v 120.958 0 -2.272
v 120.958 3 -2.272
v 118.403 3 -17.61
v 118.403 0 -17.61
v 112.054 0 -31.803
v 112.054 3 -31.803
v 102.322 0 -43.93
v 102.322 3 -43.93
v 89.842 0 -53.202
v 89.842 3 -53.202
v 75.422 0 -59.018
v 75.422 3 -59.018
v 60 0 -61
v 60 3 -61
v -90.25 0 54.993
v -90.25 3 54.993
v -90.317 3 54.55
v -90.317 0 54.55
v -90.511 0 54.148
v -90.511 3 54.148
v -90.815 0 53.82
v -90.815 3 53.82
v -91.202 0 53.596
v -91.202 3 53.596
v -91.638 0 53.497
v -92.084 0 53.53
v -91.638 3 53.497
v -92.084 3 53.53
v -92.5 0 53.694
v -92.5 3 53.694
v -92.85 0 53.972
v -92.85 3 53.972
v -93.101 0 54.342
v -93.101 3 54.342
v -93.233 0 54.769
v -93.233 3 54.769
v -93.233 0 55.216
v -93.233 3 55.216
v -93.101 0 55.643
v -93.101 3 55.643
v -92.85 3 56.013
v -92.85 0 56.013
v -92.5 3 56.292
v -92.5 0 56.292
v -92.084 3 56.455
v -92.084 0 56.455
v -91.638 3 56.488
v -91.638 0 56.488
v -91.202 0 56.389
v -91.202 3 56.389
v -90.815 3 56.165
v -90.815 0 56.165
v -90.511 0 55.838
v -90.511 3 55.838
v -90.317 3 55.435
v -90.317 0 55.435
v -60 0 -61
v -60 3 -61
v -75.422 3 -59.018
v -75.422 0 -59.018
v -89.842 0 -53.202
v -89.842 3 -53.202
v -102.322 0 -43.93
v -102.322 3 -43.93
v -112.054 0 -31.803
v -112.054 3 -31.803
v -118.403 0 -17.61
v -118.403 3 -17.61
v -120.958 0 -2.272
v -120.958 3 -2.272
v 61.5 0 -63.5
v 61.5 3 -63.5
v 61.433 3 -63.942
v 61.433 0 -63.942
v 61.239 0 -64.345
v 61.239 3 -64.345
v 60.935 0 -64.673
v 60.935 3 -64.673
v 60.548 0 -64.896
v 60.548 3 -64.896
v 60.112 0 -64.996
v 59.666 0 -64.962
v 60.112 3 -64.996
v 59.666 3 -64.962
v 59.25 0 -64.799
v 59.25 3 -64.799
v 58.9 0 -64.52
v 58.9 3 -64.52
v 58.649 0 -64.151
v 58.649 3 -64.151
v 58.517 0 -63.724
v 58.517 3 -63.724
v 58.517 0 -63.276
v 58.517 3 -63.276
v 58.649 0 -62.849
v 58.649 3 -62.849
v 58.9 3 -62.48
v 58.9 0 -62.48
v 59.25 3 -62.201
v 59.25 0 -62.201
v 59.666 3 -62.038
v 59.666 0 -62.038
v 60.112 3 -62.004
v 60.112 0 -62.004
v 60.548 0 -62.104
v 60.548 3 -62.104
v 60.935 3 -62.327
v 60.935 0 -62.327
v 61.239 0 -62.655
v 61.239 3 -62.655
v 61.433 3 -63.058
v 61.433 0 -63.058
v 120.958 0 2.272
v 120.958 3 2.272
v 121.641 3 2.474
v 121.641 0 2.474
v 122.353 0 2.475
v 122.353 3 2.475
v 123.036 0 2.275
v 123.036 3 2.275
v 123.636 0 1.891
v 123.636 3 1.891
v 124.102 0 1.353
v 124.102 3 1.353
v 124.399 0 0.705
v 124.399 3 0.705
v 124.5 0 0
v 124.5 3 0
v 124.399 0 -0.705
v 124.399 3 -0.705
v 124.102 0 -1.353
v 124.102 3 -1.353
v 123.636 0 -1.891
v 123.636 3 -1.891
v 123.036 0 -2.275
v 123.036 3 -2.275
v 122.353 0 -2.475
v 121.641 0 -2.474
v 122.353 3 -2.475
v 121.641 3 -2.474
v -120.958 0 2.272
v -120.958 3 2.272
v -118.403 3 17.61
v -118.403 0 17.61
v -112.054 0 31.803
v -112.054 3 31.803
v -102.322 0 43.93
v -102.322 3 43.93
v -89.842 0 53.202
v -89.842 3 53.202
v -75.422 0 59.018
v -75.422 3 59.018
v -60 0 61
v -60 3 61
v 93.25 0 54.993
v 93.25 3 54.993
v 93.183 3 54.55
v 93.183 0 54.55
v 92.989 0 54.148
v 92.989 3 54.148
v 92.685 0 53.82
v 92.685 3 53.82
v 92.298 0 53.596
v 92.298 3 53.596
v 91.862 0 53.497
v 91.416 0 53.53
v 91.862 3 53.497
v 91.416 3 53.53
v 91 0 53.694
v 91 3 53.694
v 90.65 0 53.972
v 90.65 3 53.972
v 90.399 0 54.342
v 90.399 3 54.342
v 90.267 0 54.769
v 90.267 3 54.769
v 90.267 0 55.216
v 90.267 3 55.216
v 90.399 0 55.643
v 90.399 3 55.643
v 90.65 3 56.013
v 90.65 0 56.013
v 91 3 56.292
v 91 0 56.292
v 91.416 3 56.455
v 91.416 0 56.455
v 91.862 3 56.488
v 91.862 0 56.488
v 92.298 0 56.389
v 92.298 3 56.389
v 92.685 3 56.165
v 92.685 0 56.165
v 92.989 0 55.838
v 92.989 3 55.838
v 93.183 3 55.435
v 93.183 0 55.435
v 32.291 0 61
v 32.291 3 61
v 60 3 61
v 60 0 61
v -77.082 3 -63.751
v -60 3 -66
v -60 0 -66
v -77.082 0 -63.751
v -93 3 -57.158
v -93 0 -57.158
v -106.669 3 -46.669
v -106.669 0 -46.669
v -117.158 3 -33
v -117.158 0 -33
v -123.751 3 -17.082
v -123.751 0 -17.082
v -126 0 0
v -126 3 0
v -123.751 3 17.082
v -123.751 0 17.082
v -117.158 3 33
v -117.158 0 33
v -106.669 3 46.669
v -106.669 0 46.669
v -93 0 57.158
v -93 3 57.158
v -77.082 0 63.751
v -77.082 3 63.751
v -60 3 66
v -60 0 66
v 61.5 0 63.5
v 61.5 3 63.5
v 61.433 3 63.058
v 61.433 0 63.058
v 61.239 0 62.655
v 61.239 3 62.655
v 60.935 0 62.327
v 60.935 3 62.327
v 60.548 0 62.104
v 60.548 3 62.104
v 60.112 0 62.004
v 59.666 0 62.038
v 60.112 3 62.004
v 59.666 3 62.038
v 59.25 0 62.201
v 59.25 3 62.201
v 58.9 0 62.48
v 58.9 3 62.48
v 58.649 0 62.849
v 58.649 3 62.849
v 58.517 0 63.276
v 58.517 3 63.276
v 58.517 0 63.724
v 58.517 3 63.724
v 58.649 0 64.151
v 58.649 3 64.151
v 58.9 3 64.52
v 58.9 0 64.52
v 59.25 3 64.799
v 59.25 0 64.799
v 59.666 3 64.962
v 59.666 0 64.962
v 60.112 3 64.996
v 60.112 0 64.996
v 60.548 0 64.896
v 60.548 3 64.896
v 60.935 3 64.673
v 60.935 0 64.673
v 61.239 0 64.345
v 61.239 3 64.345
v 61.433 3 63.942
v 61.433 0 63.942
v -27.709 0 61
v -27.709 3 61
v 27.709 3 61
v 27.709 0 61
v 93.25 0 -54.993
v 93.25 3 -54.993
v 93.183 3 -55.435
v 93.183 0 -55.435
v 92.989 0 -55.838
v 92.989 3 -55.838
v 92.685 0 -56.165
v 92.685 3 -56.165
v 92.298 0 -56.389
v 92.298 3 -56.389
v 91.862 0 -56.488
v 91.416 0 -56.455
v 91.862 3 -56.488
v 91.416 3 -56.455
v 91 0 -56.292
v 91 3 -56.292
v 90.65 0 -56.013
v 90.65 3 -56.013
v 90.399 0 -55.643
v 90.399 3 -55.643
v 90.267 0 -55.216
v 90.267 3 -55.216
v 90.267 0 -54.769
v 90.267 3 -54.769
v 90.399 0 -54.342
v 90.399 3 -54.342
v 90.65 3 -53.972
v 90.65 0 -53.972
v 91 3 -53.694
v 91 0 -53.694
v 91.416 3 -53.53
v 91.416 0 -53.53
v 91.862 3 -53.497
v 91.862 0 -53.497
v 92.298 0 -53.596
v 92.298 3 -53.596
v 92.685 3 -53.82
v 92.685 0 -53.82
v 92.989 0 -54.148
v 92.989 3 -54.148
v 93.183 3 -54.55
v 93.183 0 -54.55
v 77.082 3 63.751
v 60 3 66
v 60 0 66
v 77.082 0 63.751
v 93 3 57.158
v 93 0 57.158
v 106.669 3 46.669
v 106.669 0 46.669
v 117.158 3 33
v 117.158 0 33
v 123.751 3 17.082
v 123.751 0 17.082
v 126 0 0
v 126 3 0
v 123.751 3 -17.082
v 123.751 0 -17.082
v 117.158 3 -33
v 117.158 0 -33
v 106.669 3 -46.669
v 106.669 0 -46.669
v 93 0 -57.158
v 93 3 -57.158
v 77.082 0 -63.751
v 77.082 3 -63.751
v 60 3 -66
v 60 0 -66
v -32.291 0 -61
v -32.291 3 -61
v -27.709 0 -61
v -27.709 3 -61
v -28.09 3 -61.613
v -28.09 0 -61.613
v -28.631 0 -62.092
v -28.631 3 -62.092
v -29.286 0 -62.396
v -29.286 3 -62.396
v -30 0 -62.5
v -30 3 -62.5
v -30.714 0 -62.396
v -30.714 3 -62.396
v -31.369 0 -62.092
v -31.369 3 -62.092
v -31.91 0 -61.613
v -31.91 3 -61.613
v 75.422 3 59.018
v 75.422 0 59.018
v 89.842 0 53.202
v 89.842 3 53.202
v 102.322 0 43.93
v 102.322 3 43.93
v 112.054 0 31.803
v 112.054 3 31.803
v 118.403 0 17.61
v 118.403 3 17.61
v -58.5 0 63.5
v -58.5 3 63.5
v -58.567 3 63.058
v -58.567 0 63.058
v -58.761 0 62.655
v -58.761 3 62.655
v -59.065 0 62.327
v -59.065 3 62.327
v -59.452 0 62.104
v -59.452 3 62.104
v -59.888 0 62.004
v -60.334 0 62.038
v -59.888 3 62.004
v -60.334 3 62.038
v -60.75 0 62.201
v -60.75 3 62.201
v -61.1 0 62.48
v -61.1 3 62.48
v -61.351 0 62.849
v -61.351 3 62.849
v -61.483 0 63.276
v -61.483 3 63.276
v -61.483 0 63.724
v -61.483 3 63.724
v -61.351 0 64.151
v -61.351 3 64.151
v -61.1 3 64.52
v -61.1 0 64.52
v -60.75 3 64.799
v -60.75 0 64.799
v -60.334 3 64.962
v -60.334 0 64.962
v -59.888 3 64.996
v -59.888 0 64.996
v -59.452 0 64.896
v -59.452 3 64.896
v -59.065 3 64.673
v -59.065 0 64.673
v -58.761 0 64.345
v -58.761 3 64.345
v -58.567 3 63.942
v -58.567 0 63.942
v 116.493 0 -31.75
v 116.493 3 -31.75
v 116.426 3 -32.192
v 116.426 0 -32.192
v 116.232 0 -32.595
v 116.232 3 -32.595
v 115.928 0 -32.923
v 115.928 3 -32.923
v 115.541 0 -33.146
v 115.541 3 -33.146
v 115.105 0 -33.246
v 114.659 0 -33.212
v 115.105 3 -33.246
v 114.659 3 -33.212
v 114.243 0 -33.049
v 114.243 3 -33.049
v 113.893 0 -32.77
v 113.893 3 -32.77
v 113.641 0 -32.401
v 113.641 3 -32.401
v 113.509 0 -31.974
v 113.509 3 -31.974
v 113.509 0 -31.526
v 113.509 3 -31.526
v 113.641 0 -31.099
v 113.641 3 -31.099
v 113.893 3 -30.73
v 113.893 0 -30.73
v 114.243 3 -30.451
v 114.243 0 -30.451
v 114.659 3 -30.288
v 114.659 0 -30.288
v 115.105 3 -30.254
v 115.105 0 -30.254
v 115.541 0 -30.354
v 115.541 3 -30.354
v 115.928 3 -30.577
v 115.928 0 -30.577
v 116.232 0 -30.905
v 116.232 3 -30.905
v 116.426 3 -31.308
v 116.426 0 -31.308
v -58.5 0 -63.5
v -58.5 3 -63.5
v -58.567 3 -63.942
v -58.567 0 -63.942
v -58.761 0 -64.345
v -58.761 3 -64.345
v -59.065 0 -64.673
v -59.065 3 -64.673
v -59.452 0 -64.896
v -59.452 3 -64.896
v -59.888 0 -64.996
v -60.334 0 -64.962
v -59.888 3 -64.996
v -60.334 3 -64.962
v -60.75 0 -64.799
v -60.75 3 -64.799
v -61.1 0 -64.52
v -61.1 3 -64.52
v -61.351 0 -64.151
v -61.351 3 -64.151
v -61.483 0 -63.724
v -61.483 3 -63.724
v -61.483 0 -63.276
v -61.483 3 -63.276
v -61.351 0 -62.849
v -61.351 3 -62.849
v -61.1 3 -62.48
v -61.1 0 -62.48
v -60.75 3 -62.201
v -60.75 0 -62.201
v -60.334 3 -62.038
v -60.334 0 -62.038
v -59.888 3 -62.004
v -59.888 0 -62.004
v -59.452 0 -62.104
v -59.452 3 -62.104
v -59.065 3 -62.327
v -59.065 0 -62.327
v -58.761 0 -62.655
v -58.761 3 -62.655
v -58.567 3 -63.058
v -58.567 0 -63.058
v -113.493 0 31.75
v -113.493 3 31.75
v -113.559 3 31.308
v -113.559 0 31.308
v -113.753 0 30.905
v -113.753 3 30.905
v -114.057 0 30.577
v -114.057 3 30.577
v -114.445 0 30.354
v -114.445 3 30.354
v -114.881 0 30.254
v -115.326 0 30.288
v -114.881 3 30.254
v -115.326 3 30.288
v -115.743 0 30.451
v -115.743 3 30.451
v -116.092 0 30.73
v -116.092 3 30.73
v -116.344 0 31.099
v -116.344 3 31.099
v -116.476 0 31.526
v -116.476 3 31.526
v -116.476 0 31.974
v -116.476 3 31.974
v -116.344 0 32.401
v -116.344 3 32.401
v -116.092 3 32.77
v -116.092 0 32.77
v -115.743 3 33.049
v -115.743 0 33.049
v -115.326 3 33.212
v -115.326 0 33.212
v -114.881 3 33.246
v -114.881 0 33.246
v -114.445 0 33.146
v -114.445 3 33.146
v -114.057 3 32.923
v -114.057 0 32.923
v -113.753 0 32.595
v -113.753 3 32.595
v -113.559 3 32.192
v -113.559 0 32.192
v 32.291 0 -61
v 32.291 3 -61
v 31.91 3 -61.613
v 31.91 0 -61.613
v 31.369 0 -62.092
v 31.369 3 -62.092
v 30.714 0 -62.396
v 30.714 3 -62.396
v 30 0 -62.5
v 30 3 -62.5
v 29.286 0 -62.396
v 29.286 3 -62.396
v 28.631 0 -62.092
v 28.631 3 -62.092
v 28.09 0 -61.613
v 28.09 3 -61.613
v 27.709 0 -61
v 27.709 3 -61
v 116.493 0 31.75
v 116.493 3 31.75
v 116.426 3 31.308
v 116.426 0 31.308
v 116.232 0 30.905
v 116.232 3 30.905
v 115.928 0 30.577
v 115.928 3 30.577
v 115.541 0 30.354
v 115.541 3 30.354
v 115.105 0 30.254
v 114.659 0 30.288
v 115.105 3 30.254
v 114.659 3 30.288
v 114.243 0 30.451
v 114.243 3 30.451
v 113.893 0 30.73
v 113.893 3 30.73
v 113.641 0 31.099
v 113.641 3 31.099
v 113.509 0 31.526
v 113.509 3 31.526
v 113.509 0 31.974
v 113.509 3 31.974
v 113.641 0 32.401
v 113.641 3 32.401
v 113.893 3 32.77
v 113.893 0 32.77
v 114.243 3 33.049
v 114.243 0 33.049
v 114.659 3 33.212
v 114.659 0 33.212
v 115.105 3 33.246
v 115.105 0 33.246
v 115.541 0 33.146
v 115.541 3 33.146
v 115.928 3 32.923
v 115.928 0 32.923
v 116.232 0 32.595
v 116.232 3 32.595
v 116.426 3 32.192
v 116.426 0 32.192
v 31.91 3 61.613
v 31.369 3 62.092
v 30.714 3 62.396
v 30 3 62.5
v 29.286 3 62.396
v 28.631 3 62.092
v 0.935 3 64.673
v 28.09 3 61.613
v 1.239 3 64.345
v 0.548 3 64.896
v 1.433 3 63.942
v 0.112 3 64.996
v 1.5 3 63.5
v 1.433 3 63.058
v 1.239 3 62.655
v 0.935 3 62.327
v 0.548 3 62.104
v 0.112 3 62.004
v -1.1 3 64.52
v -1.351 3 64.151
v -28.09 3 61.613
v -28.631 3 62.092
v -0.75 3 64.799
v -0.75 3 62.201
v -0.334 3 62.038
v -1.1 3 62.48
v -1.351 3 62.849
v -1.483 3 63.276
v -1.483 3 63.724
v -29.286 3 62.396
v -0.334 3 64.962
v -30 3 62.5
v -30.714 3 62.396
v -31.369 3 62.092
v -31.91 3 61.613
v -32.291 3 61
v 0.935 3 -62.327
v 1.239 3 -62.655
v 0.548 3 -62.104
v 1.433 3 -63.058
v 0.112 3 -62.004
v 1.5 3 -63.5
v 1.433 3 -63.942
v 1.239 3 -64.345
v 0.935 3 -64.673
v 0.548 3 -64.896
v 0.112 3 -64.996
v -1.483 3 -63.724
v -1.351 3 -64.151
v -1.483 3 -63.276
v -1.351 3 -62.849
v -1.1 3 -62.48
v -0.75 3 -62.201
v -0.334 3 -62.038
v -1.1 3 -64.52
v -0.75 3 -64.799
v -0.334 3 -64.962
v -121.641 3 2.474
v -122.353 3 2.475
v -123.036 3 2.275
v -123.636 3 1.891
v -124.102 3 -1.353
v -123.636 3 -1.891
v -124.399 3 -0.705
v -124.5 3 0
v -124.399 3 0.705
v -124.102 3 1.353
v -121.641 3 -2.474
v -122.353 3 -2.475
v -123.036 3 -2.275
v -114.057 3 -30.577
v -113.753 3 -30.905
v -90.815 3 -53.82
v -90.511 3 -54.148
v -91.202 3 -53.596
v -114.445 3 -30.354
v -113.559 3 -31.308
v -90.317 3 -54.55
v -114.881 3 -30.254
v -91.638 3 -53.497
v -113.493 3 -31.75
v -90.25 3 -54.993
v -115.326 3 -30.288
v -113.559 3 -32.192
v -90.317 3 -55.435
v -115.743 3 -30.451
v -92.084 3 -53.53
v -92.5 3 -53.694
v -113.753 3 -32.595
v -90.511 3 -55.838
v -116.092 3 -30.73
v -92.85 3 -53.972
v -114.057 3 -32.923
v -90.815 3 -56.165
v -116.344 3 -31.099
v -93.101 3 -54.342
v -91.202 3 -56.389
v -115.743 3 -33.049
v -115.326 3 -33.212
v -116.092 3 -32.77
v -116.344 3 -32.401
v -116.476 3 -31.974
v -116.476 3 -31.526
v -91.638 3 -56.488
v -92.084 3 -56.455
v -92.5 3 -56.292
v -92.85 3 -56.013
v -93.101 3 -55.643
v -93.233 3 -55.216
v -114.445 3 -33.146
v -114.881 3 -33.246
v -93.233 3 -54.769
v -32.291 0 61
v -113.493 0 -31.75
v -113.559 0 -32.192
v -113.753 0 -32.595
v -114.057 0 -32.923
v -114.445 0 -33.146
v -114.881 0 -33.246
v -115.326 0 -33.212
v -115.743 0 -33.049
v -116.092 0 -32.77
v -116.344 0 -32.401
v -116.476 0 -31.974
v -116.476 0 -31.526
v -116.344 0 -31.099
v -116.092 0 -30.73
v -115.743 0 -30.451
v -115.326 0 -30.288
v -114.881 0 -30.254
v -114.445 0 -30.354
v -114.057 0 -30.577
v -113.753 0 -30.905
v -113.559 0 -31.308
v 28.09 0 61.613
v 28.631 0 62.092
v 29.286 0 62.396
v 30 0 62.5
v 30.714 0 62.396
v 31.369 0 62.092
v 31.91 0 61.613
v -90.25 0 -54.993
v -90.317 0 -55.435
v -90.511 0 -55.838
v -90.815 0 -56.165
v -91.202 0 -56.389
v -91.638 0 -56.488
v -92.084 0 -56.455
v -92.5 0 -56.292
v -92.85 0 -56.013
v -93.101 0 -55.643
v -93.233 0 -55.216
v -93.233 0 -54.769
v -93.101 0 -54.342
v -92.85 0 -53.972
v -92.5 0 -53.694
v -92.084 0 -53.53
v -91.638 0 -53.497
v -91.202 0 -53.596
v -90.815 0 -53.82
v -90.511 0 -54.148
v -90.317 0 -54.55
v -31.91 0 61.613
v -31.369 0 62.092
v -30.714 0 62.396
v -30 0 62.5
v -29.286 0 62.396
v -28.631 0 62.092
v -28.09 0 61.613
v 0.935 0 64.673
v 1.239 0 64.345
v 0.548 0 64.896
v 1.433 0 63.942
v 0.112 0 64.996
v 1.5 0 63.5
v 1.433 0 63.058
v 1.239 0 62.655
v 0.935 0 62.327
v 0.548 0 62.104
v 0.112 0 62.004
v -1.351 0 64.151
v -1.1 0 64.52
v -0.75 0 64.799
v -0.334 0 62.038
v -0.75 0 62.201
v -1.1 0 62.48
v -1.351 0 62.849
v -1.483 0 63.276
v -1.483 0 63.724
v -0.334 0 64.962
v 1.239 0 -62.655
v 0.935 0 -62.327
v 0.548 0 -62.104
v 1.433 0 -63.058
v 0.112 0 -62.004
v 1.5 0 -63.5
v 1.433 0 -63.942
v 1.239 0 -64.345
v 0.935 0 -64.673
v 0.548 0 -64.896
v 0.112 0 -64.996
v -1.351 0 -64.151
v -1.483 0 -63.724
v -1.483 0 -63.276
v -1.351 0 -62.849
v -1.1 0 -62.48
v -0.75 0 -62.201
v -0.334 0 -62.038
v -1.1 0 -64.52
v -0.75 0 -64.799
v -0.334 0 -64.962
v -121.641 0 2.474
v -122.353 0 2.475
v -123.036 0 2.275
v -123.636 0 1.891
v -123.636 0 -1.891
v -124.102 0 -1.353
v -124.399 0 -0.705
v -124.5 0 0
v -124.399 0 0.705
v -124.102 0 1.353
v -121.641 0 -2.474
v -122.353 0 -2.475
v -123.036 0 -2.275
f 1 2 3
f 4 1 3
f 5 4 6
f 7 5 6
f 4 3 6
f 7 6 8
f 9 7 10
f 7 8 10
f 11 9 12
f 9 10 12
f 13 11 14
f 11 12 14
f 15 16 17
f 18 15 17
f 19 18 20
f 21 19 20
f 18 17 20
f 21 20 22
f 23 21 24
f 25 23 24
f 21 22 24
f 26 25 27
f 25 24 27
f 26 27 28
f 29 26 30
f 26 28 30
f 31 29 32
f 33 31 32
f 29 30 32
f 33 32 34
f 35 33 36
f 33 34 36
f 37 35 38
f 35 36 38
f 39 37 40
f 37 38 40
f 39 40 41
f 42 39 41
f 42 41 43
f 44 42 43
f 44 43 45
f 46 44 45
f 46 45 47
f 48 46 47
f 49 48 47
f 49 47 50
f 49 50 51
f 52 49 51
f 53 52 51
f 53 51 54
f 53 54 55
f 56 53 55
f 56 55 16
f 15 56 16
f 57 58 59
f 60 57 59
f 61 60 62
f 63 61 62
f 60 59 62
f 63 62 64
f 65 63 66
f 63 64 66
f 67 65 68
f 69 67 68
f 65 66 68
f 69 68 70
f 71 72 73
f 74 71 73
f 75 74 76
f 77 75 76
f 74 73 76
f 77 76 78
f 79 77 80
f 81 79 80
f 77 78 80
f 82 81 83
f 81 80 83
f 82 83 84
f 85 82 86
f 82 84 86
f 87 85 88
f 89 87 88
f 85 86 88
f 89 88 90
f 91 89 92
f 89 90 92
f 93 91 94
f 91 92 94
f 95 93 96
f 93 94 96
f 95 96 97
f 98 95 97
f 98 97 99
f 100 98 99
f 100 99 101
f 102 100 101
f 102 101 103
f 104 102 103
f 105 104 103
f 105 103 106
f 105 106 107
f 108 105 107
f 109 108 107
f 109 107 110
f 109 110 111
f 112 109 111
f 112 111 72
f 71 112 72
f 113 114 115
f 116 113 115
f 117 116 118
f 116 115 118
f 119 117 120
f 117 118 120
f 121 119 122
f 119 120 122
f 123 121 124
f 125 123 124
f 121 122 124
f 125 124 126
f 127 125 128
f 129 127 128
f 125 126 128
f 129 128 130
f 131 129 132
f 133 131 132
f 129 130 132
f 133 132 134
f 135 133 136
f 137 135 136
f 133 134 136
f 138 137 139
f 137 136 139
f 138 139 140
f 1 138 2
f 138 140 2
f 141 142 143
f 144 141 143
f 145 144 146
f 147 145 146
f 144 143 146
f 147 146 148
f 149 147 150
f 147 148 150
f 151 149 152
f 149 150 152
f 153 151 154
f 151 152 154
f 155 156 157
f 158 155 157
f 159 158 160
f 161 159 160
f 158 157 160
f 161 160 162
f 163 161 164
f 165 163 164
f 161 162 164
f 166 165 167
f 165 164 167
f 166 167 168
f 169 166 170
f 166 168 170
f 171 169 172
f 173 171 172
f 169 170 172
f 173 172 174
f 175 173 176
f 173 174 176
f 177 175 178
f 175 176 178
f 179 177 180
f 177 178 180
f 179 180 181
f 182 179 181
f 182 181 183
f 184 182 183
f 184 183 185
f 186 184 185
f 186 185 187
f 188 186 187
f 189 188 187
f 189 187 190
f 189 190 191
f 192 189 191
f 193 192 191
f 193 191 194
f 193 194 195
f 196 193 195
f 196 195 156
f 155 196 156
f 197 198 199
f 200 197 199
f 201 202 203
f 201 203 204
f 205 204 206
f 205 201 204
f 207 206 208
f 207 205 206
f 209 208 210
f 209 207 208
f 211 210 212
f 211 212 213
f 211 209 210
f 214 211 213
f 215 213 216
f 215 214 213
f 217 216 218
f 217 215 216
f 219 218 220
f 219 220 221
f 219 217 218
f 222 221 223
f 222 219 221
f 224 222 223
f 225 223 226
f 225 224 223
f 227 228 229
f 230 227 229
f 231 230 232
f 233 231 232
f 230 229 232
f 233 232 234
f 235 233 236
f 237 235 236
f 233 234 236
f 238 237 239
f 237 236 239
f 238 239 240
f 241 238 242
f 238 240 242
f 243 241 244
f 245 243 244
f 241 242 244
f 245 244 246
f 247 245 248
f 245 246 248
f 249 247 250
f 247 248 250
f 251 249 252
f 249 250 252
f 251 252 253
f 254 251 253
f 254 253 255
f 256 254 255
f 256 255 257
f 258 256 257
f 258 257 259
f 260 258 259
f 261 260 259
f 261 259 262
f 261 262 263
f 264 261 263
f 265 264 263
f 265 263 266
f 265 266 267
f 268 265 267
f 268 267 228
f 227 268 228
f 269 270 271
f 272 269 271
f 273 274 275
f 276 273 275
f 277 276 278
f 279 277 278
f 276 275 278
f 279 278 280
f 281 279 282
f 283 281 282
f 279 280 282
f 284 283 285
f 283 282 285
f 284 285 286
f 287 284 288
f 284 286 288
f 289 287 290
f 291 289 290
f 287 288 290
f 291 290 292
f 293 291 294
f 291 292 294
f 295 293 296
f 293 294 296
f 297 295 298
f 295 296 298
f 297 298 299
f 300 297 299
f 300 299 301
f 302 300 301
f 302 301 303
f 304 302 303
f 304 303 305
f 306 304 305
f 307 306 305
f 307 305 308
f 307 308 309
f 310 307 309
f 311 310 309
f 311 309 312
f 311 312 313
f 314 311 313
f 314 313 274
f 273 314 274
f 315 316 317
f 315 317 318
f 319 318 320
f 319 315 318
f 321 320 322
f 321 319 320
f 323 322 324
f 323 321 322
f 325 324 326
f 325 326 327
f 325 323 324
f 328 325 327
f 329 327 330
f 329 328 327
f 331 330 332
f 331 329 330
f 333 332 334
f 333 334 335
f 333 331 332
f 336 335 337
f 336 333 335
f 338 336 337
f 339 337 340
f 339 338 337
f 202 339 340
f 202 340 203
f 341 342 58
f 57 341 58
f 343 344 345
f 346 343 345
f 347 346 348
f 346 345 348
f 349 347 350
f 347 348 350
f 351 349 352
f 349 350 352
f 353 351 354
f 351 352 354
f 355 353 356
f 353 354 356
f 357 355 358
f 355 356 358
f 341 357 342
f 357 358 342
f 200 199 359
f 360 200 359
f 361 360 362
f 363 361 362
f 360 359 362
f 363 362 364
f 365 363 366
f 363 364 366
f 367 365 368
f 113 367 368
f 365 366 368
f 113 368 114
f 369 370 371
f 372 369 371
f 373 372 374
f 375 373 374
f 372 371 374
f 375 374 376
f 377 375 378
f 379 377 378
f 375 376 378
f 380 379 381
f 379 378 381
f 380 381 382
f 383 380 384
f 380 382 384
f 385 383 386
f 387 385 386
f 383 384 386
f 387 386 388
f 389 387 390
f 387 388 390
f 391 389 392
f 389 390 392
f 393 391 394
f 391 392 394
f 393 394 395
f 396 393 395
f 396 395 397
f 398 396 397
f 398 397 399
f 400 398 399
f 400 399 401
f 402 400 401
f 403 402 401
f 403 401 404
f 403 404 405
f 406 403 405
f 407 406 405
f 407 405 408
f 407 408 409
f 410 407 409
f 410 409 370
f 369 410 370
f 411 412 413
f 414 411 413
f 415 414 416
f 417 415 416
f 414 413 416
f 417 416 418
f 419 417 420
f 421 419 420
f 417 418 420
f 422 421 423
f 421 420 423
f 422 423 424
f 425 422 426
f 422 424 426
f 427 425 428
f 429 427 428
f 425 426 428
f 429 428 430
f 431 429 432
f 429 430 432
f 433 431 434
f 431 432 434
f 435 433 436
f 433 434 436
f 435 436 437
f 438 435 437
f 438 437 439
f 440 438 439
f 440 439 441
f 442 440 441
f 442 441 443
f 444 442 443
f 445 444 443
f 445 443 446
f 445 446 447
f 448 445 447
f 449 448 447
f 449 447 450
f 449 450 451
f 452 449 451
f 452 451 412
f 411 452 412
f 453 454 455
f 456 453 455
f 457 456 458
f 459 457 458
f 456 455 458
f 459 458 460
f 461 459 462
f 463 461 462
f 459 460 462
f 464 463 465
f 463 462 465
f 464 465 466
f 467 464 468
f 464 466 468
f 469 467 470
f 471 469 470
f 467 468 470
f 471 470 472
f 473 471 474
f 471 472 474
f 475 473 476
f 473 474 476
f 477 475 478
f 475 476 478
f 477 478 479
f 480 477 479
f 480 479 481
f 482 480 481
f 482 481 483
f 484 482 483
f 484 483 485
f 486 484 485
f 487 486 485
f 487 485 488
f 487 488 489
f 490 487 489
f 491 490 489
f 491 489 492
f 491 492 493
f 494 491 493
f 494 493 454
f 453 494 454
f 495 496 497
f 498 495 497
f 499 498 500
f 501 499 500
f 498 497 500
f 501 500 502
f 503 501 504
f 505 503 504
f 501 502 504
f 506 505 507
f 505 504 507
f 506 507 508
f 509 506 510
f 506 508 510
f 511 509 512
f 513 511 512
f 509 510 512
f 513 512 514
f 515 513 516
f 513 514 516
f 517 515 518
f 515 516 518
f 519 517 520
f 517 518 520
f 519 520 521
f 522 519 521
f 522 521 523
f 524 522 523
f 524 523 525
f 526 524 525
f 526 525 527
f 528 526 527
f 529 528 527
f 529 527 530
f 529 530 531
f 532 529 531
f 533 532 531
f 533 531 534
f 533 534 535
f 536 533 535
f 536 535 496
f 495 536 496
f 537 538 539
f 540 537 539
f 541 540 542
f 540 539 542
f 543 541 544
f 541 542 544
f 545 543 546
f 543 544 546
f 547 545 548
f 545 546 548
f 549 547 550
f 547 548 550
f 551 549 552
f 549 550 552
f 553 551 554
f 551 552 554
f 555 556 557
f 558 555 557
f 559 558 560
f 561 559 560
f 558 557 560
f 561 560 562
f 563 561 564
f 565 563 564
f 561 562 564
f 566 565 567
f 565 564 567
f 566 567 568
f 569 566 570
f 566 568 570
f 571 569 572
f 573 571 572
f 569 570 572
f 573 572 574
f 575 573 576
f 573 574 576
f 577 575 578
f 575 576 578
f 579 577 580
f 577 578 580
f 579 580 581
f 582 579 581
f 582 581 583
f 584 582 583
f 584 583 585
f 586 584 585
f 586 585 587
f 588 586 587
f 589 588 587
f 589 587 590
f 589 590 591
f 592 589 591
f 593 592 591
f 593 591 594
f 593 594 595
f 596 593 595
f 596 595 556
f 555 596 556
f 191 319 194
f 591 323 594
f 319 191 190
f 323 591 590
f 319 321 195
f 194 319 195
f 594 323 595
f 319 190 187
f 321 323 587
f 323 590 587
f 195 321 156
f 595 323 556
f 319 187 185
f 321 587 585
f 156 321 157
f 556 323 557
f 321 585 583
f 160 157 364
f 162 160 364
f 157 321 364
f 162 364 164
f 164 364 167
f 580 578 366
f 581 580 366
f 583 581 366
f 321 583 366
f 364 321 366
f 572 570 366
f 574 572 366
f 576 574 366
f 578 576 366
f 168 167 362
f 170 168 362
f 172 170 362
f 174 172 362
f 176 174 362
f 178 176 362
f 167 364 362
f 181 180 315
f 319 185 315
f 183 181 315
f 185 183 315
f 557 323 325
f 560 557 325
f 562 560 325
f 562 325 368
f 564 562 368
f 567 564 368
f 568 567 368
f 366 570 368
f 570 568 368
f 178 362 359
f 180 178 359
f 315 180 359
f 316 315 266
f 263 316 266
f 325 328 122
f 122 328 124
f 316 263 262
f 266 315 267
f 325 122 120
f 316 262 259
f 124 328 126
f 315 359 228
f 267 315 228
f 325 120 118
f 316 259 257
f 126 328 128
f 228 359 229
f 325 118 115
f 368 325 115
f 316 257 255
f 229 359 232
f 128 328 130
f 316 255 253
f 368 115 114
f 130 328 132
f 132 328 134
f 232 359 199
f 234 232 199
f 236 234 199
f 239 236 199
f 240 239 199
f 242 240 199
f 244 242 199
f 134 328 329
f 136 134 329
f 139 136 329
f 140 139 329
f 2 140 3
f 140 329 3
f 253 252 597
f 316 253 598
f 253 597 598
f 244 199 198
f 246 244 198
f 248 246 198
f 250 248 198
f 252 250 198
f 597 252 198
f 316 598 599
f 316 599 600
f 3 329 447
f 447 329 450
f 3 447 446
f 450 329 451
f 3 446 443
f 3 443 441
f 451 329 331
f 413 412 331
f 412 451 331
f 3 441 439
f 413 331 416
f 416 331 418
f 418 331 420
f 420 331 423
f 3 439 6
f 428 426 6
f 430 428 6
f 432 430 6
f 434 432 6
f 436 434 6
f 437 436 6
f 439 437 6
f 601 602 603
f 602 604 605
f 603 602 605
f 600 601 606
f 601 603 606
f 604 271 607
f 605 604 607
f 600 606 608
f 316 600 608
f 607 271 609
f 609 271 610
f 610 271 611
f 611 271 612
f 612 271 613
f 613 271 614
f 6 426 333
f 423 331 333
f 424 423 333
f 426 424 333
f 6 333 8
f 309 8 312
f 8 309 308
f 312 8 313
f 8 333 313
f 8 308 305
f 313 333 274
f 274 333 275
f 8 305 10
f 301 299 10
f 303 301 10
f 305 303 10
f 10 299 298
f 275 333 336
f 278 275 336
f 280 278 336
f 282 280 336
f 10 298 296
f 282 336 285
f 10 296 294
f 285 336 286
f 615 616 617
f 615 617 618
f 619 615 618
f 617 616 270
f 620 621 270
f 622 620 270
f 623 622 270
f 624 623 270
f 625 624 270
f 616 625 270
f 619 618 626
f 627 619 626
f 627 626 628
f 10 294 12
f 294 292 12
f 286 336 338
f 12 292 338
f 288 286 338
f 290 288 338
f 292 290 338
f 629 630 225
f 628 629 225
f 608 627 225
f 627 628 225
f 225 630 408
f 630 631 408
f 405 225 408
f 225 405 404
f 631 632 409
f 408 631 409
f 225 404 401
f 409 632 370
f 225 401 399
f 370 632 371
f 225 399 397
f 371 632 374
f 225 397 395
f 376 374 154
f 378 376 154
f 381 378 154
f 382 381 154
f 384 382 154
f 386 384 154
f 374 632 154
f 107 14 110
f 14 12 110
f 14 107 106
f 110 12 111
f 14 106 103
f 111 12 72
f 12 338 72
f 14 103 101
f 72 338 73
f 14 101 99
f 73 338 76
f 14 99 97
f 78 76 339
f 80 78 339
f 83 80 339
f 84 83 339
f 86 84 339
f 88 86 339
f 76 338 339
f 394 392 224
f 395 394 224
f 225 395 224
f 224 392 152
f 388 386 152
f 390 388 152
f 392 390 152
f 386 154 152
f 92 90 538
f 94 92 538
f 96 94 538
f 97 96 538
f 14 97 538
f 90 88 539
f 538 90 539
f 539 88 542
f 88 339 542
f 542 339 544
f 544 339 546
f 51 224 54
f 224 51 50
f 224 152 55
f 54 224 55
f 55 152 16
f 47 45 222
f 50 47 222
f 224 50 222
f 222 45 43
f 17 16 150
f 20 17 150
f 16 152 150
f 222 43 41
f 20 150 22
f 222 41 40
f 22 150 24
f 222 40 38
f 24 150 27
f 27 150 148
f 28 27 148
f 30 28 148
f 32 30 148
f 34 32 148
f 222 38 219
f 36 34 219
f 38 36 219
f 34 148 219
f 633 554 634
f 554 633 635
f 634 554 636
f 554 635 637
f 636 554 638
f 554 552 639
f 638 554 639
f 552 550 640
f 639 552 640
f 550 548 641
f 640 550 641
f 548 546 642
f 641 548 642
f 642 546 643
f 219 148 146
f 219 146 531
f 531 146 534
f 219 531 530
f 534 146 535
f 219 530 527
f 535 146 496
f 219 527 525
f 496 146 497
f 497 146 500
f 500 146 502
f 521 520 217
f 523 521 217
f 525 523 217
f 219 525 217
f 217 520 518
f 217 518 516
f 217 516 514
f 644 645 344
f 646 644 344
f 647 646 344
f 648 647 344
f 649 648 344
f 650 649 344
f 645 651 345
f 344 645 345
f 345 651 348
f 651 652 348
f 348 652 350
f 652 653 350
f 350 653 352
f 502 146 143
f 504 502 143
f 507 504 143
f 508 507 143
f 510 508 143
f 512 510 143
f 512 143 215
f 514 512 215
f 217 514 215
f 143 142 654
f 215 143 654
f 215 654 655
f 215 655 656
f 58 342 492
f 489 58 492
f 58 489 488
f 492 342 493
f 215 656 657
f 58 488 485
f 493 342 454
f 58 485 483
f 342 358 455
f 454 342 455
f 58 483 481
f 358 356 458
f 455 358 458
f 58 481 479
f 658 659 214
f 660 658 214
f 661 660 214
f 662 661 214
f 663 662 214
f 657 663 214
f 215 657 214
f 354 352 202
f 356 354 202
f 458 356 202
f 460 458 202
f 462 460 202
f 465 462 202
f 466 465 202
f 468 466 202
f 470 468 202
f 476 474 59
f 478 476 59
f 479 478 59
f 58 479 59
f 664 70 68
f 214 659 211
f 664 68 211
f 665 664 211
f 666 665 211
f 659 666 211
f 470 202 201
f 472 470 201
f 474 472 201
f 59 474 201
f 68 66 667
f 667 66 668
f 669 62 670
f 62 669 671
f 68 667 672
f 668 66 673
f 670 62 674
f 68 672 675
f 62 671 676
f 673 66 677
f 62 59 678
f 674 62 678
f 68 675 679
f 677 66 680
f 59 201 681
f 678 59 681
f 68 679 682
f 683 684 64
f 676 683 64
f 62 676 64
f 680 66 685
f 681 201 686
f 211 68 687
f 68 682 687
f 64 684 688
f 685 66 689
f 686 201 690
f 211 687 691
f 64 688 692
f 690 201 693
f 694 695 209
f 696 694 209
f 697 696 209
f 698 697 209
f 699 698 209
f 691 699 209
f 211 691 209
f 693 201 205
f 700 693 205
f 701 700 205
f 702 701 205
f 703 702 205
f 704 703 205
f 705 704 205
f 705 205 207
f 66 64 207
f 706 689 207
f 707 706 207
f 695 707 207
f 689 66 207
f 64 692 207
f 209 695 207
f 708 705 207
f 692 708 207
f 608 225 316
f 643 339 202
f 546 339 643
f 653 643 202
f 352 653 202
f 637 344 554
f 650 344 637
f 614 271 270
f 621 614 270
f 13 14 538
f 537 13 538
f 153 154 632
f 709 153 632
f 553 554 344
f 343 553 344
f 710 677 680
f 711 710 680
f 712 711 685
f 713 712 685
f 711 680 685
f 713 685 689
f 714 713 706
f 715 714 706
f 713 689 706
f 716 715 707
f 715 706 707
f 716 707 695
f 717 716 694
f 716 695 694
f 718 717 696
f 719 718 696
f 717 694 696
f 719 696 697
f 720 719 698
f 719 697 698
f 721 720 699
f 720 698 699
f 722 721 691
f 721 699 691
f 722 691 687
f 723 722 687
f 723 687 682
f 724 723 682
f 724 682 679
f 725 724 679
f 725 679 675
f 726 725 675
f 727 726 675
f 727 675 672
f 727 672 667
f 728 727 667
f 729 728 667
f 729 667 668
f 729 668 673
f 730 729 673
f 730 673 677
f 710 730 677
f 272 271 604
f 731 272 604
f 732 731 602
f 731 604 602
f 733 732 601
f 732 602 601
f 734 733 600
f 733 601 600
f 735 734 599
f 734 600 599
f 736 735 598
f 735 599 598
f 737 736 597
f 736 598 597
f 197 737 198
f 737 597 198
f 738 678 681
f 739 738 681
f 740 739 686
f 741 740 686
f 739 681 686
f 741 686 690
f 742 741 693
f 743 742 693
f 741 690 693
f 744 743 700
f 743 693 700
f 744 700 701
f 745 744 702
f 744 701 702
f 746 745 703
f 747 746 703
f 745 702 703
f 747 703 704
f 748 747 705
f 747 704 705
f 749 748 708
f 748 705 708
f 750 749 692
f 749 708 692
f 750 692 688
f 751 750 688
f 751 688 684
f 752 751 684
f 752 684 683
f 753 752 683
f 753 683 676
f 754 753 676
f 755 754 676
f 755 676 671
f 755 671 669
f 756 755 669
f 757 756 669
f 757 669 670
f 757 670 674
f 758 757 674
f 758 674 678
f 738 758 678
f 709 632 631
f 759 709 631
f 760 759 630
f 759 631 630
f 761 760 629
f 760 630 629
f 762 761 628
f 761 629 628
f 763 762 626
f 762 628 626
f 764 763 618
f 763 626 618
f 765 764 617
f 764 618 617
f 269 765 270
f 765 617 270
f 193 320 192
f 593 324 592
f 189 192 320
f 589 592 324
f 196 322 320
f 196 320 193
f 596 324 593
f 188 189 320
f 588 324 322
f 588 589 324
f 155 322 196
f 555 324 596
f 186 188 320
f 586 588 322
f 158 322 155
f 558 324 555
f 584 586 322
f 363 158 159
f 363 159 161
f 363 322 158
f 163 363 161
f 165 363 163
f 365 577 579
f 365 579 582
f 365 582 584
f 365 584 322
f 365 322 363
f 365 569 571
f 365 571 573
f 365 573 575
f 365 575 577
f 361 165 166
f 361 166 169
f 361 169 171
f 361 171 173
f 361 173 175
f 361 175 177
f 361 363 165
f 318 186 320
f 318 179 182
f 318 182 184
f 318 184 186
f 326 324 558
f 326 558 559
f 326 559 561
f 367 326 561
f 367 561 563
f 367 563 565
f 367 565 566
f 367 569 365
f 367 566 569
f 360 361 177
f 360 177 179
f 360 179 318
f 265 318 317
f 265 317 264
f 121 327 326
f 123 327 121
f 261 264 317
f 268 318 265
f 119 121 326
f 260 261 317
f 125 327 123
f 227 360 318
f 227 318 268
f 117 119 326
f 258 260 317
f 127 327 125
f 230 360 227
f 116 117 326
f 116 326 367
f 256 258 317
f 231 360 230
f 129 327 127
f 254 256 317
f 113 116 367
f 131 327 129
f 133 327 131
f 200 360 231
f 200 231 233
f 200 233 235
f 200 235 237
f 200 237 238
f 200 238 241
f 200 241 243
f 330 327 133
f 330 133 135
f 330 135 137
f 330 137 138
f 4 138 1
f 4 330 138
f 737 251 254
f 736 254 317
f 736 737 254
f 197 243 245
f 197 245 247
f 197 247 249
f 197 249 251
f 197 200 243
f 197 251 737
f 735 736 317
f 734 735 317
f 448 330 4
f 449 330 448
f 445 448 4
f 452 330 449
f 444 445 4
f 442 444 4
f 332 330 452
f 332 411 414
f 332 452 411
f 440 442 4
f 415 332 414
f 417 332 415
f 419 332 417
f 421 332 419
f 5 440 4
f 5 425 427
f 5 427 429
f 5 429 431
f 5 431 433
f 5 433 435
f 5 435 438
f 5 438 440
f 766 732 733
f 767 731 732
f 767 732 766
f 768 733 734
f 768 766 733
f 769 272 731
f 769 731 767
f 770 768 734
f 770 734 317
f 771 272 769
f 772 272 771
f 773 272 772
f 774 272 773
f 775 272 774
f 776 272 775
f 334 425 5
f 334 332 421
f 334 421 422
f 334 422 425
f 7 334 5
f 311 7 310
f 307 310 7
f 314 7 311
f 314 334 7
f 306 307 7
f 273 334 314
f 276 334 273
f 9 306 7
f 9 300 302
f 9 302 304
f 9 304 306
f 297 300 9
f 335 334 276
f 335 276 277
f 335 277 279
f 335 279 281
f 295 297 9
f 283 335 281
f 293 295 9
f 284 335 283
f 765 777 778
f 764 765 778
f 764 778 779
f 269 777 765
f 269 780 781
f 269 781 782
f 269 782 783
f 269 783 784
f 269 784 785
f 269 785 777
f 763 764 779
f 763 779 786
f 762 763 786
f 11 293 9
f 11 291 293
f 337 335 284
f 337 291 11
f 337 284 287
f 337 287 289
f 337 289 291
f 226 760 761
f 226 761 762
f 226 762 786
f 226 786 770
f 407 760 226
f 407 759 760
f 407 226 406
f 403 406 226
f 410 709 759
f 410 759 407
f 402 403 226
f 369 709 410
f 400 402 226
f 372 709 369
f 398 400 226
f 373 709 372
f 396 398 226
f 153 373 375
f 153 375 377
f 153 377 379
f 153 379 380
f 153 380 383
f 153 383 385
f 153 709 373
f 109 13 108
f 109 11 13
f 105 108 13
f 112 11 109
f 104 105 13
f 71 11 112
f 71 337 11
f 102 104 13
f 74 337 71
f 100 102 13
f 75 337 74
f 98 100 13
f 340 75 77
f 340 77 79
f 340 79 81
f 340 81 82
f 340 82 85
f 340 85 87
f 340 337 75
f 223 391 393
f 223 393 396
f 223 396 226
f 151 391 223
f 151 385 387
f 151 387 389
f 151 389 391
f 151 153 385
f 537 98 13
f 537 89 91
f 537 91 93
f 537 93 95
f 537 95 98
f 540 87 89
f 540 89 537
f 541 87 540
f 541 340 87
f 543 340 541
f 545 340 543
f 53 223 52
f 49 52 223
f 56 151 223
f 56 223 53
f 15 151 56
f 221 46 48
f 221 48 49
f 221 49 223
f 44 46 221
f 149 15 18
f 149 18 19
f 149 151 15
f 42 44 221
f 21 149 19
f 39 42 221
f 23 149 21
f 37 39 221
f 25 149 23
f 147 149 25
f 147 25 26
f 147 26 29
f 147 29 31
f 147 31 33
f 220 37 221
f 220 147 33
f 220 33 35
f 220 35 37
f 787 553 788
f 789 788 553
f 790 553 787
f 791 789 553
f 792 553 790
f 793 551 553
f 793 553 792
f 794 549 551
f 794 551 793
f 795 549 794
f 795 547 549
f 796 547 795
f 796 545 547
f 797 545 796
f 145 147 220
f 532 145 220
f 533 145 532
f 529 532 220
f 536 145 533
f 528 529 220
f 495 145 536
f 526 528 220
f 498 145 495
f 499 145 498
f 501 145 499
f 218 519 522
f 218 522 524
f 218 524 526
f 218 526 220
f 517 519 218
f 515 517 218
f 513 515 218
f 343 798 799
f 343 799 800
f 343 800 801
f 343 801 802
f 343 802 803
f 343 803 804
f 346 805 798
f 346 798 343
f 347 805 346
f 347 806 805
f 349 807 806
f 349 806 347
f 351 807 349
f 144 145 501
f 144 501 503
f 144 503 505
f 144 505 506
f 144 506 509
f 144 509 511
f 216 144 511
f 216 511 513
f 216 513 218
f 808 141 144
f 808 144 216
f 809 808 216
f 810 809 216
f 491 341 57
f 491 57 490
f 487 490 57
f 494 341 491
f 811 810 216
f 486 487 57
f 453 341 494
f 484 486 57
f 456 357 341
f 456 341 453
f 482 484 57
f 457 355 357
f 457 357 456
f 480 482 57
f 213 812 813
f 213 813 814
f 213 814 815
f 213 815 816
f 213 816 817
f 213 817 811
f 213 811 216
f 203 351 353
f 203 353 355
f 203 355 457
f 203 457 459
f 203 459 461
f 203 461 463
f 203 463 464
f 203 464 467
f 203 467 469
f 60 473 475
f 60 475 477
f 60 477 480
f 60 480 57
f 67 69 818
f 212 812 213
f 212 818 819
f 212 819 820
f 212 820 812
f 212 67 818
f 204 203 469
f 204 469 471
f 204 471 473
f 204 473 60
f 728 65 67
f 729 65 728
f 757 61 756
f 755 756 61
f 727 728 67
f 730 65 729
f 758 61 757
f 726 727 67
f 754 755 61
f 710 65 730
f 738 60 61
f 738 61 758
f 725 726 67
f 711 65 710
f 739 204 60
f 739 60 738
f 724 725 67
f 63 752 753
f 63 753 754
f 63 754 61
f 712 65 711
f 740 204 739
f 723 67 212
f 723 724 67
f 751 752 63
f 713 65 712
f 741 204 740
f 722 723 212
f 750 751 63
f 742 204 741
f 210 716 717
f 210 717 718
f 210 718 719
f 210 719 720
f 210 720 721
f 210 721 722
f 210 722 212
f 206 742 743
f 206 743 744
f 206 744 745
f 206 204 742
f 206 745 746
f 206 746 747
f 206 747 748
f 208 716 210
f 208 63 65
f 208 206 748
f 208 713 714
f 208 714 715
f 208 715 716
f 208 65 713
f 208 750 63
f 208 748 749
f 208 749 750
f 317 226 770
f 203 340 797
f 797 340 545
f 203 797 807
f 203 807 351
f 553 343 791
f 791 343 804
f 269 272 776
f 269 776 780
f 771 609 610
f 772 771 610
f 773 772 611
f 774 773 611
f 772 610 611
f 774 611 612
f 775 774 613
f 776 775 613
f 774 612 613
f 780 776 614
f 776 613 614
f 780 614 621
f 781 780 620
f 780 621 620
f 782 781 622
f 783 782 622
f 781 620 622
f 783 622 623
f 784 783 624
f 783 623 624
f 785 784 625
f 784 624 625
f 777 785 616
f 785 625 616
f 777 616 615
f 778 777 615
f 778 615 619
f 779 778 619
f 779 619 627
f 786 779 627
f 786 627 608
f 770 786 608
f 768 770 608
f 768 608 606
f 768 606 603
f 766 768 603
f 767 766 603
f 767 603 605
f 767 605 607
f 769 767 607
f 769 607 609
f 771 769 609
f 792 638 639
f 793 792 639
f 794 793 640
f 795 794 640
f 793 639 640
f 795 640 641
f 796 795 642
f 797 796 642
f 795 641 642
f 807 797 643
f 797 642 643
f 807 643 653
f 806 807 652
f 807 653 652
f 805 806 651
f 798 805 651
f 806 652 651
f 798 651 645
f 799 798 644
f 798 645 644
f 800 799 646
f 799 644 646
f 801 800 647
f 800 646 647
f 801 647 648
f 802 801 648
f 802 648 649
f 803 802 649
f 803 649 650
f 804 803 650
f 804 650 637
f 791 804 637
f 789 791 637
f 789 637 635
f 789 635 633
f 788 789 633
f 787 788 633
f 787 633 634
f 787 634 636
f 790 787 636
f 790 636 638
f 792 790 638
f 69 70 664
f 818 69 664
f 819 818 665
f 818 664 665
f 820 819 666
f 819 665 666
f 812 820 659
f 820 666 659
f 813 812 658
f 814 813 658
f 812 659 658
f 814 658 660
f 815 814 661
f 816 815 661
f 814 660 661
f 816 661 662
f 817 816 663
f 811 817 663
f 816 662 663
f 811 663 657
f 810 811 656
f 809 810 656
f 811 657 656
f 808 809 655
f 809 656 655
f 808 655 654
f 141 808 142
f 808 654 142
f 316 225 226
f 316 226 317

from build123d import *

# Parameters (mm, degrees)
SKETCH_1_R          = 1.5
EXTRUDE_2_DEPTH     = 3
CUT_EXTRUDE_1_DEPTH = 10
SKETCH_4_R          = 7.5
CUT_EXTRUDE_2_DEPTH = 10
SKETCH_5_R          = 1.5
CUT_EXTRUDE_3_DEPTH = 10
CUT_EXTRUDE_4_DEPTH = 10


with BuildPart() as part:
    # 草图1 → 凸台-拉伸2 (new body)
    with BuildSketch(Plane(origin=(0, 0, 0), x_dir=(1, 0, 0), z_dir=(0, 1, 0))):
        with BuildLine():
            Line((-60, 70), (60, 70))
            ThreePointArc((60, 70), (130, 0), (60, -70))
            Line((60, -70), (-60, -70))
            ThreePointArc((-60, -70), (-130, 0), (-60, 70))
        make_face()
        with Locations((-122, 0)):
            Circle(SKETCH_1_R, mode=Mode.SUBTRACT)
        with Locations((122, 0)):
            Circle(SKETCH_1_R, mode=Mode.SUBTRACT)
        with Locations((-30, 60)):
            Circle(SKETCH_1_R, mode=Mode.SUBTRACT)
        with Locations((30, 60)):
            Circle(SKETCH_1_R, mode=Mode.SUBTRACT)
        with Locations((30, -60)):
            Circle(SKETCH_1_R, mode=Mode.SUBTRACT)
        with Locations((-30, -60)):
            Circle(SKETCH_1_R, mode=Mode.SUBTRACT)
    extrude(amount=EXTRUDE_2_DEPTH)

    # 草图3 → 切除-拉伸1 (cut)
    with BuildSketch(Plane(origin=(0, 3, 0), x_dir=(1, 0, 0), z_dir=(0, 1, 0))):
        with BuildLine():
            Line((-60, -70), (60, -70))
            ThreePointArc((60, -70), (130, 0), (60, 70))
            Line((60, 70), (-60, 70))
            ThreePointArc((-60, 70), (-130, 0), (-60, -70))
        make_face()
        with BuildLine():
            Line((-60, -66), (60, -66))
            ThreePointArc((60, -66), (126, 0), (60, 66))
            Line((60, 66), (-60, 66))
            ThreePointArc((-60, 66), (-126, 0), (-60, -66))
        make_face(mode=Mode.SUBTRACT)
    extrude(amount=-CUT_EXTRUDE_1_DEPTH, mode=Mode.SUBTRACT)

    # 草图4 → 切除-拉伸2 (cut)
    with BuildSketch(Plane(origin=(0, 3, 0), x_dir=(1, 0, 0), z_dir=(0, 1, 0))):
        with Locations((-96, 0)):
            Circle(SKETCH_4_R)
        with Locations((96, 0)):
            Circle(SKETCH_4_R)
        with Locations((0, 36)):
            Circle(SKETCH_4_R)
        with Locations((0, -36)):
            Circle(SKETCH_4_R)
        with Locations((-60, -36)):
            Circle(SKETCH_4_R)
        with Locations((60, -36)):
            Circle(SKETCH_4_R)
        with Locations((30, -36)):
            Circle(SKETCH_4_R)
        with Locations((-30, -36)):
            Circle(SKETCH_4_R)
        with Locations((-85.455844123, -25.455844123)):
            Circle(SKETCH_4_R)
        with Locations((60, 36)):
            Circle(SKETCH_4_R)
        with Locations((30, 36)):
            Circle(SKETCH_4_R)
        with Locations((-85.455844123, 25.455844123)):
            Circle(SKETCH_4_R)
        with Locations((-30, 36)):
            Circle(SKETCH_4_R)
        with Locations((-60, 36)):
            Circle(SKETCH_4_R)
        with Locations((85.455844123, -25.455844123)):
            Circle(SKETCH_4_R)
        with Locations((85.455844123, 25.455844123)):
            Circle(SKETCH_4_R)
    extrude(amount=-CUT_EXTRUDE_2_DEPTH, mode=Mode.SUBTRACT)

    # 草图5 → 切除-拉伸3 (cut)
    with BuildSketch(Plane(origin=(0, 3, 0), x_dir=(1, 0, 0), z_dir=(0, 1, 0))):
        with Locations((-60, 63.5)):
            Circle(SKETCH_5_R)
        with Locations((114.99261314, 31.75)):
            Circle(SKETCH_5_R)
        with Locations((0, 63.5)):
            Circle(SKETCH_5_R)
        with Locations((60, 63.5)):
            Circle(SKETCH_5_R)
        with Locations((91.75, 54.99261314)):
            Circle(SKETCH_5_R)
        with Locations((91.75, -54.99261314)):
            Circle(SKETCH_5_R)
        with Locations((114.99261314, -31.75)):
            Circle(SKETCH_5_R)
        with Locations((-91.75, -54.99261314)):
            Circle(SKETCH_5_R)
        with Locations((-114.99261314, -31.75)):
            Circle(SKETCH_5_R)
        with Locations((-91.75, 54.99261314)):
            Circle(SKETCH_5_R)
        with Locations((-114.99261314, 31.75)):
            Circle(SKETCH_5_R)
        with Locations((60, -63.5)):
            Circle(SKETCH_5_R)
        with Locations((0, -63.5)):
            Circle(SKETCH_5_R)
        with Locations((-60, -63.5)):
            Circle(SKETCH_5_R)
    extrude(amount=-CUT_EXTRUDE_3_DEPTH, mode=Mode.SUBTRACT)

    # 草图6 → 切除-拉伸4 (cut)
    with BuildSketch(Plane(origin=(0, 3, 0), x_dir=(1, 0, 0), z_dir=(0, 1, 0))):
        with BuildLine():
            Line((60, 61), (32.291287847, 61))
            ThreePointArc((32.291287847, 61), (30, 62.5), (27.708712153, 61))
            Line((27.708712153, 61), (-27.708712153, 61))
            ThreePointArc((-27.708712153, 61), (-30, 62.5), (-32.291287847, 61))
            Line((-32.291287847, 61), (-60, 61))
            ThreePointArc((-60, 61), (-102.322495481, 43.929561531), (-120.95766129, 2.272340207))
            ThreePointArc((-120.95766129, 2.272340207), (-124.5, 0), (-120.95766129, -2.272340207))
            ThreePointArc((-120.95766129, -2.272340207), (-102.322495481, -43.929561531), (-60, -61))
            Line((-60, -61), (-32.291287847, -61))
            ThreePointArc((-32.291287847, -61), (-30, -62.5), (-27.708712153, -61))
            Line((-27.708712153, -61), (27.708712153, -61))
            ThreePointArc((27.708712153, -61), (30, -62.5), (32.291287847, -61))
            Line((32.291287847, -61), (60, -61))
            ThreePointArc((60, -61), (102.322495481, -43.929561531), (120.95766129, -2.272340207))
            ThreePointArc((120.95766129, -2.272340207), (124.5, 0), (120.95766129, 2.272340207))
            ThreePointArc((120.95766129, 2.272340207), (102.322495481, 43.929561531), (60, 61))
        make_face()
    extrude(amount=-CUT_EXTRUDE_4_DEPTH, mode=Mode.SUBTRACT)


solid = part.part
